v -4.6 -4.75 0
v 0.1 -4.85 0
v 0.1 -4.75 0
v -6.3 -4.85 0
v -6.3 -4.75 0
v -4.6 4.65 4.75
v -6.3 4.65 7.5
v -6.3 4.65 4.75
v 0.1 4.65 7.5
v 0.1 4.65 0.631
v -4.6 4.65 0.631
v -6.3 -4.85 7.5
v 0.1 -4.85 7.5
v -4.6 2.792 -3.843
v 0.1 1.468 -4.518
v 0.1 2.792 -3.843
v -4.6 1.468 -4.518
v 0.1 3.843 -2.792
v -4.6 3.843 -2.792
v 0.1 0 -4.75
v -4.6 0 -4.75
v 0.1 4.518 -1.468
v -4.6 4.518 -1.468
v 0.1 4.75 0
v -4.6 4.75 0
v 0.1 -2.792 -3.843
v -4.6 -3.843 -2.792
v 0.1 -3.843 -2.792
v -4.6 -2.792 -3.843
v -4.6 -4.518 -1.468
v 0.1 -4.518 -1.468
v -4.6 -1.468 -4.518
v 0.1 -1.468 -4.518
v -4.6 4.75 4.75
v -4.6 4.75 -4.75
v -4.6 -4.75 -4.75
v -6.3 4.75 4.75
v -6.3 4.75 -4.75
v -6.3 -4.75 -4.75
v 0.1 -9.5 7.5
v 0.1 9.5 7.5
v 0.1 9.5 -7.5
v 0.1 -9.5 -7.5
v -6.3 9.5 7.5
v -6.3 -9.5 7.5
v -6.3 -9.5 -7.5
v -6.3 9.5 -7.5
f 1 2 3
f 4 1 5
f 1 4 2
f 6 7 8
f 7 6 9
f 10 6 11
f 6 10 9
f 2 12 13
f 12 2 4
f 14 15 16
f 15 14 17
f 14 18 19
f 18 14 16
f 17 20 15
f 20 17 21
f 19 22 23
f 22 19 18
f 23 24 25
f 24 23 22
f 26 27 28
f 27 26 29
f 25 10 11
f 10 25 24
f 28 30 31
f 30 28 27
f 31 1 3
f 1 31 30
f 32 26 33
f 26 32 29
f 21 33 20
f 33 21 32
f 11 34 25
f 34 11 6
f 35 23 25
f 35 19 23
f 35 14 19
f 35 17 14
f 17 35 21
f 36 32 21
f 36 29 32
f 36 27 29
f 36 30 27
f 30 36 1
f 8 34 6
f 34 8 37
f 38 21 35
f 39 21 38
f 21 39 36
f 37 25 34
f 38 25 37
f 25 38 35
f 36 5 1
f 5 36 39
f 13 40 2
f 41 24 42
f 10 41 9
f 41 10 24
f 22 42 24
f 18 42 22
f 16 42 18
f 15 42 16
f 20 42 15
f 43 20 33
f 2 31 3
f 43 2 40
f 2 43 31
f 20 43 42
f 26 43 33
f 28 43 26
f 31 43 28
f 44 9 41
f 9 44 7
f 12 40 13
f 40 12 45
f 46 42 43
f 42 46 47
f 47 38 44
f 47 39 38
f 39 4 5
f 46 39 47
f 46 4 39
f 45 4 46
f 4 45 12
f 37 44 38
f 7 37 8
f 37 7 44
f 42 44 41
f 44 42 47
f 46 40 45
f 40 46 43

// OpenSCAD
barrelSocketMount();
module barrelSocketMount(x=0,y=0,z=0,diameter=9.5,height=15,thickness=3.2){
    translate([x-2*thickness,y,z])  //align front with y axis and apply offsets
    difference(){
        translate([thickness+.1,0,0])
        cube([thickness*2,diameter*2,height],center=true);  //cutout to top
        union(){   //adaptor shape
            translate([0,-(diameter/2+.1),0])    //move cube to centreline
            cube([2*thickness+.2,diameter,diameter]);
            rotate([0,90,0])                // rotate vertical
            cylinder(d=diameter,h=2*thickness+.2,$fn=20);
            cube([thickness+.2*2,diameter,diameter],center=true);
        }
    }
}
